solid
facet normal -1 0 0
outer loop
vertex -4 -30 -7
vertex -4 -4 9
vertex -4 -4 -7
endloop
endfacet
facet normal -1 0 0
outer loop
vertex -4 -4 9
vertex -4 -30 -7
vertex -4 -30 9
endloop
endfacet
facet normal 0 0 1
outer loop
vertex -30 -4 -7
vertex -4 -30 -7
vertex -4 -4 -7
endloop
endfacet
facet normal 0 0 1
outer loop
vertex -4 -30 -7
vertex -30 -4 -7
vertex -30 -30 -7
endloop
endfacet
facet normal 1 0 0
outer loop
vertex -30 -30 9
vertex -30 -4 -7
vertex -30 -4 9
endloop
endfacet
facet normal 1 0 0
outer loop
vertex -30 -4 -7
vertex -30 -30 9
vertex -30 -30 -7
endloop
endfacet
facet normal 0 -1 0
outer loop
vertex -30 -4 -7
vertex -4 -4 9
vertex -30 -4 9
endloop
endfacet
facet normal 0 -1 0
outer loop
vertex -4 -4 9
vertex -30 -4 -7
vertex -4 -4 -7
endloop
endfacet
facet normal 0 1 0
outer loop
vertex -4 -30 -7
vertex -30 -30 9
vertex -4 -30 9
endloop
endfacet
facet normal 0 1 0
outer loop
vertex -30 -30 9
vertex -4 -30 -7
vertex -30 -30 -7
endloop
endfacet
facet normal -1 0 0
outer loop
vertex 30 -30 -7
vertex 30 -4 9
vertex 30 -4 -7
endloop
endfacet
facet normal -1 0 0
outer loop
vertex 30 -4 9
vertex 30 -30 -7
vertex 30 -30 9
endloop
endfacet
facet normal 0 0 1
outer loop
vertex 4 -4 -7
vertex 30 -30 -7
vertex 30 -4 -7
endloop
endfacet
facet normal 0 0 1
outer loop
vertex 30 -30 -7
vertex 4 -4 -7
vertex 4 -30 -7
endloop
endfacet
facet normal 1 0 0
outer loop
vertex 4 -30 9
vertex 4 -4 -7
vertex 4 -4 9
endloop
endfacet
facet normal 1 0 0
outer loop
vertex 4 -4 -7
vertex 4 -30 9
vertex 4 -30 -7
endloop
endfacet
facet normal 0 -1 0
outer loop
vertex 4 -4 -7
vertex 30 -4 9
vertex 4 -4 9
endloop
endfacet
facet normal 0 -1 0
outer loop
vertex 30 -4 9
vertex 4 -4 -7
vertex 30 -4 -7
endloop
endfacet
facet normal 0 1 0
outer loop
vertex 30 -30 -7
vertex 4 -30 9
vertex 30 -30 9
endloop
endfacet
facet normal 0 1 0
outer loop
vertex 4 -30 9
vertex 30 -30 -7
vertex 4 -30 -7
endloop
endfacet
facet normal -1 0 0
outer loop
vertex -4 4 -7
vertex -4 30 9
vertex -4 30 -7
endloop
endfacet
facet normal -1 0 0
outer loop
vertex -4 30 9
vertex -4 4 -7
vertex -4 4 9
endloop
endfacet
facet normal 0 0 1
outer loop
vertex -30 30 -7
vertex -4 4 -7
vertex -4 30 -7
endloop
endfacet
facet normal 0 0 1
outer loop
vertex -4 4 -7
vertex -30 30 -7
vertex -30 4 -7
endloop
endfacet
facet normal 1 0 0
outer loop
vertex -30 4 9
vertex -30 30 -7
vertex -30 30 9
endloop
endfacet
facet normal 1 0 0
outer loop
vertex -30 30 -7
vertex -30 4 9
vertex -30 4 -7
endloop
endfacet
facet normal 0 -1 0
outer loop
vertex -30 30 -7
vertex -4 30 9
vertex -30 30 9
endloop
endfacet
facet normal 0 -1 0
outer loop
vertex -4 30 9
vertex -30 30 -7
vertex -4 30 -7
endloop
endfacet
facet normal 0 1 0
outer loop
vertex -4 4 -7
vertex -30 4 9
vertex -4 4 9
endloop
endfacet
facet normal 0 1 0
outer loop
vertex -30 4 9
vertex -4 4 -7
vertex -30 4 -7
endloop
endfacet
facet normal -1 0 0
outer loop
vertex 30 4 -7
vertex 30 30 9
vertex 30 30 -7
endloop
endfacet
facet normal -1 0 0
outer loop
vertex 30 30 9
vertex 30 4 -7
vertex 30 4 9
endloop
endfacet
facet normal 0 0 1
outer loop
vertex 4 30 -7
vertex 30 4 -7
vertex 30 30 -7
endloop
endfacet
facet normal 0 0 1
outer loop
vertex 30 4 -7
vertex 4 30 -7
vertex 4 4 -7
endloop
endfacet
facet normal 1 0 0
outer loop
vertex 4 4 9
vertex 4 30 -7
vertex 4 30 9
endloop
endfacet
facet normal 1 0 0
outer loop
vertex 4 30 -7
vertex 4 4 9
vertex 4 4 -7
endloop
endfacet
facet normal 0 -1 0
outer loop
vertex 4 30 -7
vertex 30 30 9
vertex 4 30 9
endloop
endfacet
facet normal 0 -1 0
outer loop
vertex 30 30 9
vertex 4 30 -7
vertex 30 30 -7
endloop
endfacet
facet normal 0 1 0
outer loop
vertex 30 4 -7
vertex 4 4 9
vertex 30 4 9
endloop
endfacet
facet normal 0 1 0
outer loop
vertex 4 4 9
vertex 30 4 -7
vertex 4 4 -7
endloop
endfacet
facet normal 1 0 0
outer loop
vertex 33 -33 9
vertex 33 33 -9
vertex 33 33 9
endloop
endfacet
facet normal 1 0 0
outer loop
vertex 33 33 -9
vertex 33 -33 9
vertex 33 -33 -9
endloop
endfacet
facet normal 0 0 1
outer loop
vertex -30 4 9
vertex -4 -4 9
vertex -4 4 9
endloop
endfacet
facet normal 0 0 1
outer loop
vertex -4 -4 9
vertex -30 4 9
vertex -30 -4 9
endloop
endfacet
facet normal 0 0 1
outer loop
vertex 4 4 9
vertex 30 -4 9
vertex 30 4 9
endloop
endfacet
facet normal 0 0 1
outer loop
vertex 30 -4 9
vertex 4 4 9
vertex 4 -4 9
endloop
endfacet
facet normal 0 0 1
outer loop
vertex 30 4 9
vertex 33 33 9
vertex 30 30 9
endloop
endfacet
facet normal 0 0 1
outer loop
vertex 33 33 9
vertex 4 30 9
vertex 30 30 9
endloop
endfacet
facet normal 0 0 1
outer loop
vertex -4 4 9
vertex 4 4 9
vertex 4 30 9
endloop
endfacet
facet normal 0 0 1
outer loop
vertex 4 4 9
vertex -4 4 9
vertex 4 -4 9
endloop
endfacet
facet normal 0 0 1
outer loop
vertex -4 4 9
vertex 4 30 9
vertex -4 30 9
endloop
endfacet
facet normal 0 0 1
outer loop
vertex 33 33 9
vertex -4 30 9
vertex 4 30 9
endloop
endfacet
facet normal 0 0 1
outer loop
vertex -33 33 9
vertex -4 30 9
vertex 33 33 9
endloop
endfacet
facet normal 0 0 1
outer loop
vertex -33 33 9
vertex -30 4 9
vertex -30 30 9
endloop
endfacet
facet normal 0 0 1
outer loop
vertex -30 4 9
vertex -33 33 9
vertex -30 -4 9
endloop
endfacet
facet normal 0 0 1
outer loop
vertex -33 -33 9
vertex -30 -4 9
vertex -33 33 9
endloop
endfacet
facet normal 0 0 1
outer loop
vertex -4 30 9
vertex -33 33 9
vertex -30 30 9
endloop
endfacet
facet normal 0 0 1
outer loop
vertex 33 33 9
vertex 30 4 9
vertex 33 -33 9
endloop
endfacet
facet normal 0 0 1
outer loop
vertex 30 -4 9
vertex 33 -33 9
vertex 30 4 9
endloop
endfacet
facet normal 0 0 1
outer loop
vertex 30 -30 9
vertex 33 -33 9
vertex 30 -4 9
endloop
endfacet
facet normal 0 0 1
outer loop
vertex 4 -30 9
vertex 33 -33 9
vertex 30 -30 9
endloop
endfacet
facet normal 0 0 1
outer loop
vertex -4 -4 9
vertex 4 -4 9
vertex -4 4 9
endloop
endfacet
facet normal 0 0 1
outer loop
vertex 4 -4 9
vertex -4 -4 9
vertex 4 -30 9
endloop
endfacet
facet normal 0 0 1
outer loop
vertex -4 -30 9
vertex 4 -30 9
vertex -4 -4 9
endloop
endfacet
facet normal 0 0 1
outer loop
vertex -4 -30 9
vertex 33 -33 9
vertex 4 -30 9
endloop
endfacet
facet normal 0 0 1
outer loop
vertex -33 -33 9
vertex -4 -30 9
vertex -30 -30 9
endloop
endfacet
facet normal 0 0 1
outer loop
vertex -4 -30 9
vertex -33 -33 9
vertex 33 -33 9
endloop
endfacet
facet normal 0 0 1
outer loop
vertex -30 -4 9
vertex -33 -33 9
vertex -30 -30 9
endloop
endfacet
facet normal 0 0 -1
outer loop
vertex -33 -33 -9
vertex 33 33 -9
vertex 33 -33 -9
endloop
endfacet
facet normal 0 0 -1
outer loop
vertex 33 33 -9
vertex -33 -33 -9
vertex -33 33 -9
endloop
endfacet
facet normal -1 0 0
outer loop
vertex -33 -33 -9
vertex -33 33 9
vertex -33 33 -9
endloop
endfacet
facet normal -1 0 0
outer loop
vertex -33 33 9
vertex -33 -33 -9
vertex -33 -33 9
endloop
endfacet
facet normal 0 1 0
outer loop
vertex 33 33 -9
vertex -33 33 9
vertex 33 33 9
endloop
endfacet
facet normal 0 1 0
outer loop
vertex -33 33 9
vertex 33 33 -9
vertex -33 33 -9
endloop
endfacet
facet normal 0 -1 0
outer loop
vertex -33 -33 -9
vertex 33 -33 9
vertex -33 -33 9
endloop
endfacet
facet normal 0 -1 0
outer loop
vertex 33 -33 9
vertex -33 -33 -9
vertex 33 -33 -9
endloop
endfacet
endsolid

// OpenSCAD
$fn = 32;

// ----------------------------------------------------------------------
// Pocket plate 66 x 66 x 18
// 2 x 2 pockets 26 mm square, 16 mm deep
// ----------------------------------------------------------------------

// --- parameters (mm) ---
thickness = 18;  // plate thickness
floor_t = 2;     // material left under each pocket
pocket = 26;     // pocket side length
pitch_x = 34;    // pocket pitch along X
pitch_y = 34;    // pocket pitch along Y
cols = 2;        // pockets per row
rows = 2;        // rows of pockets

// --- derived feature positions (mm) ---
depth = thickness - floor_t;        // = 16   pocket depth, down to the floor
span_x = (cols - 1) * pitch_x;      // = 34   distance between outer pockets
span_y = (rows - 1) * pitch_y;      // = 34   distance between outer pocket rows
origin_x = -span_x / 2;             // = -17   X of the first pocket
origin_y = -span_y / 2;             // = -17   Y of the first pocket
plate = [span_x + pocket + 6, span_y + pocket + 6, thickness];  // = [66, 66, 18]   overall size: pockets plus 3 mm of wall on each side
feature_centers = [
  [origin_x + 0 * pitch_x, origin_y + 0 * pitch_y],
  [origin_x + 1 * pitch_x, origin_y + 0 * pitch_y],
  [origin_x + 0 * pitch_x, origin_y + 1 * pitch_y],
  [origin_x + 1 * pitch_x, origin_y + 1 * pitch_y]
];   // pocket centres, used verbatim by the cutter loop

// plate outline, then one pocket per centre in feature_centers
difference() {
  cube(plate, center = true);
  for (centre = feature_centers)
    translate([centre[0] - pocket / 2, centre[1] - pocket / 2, plate[2] / 2 - depth])
      cube([pocket, pocket, depth + 1]);  // centred on the declared pocket centre
}
